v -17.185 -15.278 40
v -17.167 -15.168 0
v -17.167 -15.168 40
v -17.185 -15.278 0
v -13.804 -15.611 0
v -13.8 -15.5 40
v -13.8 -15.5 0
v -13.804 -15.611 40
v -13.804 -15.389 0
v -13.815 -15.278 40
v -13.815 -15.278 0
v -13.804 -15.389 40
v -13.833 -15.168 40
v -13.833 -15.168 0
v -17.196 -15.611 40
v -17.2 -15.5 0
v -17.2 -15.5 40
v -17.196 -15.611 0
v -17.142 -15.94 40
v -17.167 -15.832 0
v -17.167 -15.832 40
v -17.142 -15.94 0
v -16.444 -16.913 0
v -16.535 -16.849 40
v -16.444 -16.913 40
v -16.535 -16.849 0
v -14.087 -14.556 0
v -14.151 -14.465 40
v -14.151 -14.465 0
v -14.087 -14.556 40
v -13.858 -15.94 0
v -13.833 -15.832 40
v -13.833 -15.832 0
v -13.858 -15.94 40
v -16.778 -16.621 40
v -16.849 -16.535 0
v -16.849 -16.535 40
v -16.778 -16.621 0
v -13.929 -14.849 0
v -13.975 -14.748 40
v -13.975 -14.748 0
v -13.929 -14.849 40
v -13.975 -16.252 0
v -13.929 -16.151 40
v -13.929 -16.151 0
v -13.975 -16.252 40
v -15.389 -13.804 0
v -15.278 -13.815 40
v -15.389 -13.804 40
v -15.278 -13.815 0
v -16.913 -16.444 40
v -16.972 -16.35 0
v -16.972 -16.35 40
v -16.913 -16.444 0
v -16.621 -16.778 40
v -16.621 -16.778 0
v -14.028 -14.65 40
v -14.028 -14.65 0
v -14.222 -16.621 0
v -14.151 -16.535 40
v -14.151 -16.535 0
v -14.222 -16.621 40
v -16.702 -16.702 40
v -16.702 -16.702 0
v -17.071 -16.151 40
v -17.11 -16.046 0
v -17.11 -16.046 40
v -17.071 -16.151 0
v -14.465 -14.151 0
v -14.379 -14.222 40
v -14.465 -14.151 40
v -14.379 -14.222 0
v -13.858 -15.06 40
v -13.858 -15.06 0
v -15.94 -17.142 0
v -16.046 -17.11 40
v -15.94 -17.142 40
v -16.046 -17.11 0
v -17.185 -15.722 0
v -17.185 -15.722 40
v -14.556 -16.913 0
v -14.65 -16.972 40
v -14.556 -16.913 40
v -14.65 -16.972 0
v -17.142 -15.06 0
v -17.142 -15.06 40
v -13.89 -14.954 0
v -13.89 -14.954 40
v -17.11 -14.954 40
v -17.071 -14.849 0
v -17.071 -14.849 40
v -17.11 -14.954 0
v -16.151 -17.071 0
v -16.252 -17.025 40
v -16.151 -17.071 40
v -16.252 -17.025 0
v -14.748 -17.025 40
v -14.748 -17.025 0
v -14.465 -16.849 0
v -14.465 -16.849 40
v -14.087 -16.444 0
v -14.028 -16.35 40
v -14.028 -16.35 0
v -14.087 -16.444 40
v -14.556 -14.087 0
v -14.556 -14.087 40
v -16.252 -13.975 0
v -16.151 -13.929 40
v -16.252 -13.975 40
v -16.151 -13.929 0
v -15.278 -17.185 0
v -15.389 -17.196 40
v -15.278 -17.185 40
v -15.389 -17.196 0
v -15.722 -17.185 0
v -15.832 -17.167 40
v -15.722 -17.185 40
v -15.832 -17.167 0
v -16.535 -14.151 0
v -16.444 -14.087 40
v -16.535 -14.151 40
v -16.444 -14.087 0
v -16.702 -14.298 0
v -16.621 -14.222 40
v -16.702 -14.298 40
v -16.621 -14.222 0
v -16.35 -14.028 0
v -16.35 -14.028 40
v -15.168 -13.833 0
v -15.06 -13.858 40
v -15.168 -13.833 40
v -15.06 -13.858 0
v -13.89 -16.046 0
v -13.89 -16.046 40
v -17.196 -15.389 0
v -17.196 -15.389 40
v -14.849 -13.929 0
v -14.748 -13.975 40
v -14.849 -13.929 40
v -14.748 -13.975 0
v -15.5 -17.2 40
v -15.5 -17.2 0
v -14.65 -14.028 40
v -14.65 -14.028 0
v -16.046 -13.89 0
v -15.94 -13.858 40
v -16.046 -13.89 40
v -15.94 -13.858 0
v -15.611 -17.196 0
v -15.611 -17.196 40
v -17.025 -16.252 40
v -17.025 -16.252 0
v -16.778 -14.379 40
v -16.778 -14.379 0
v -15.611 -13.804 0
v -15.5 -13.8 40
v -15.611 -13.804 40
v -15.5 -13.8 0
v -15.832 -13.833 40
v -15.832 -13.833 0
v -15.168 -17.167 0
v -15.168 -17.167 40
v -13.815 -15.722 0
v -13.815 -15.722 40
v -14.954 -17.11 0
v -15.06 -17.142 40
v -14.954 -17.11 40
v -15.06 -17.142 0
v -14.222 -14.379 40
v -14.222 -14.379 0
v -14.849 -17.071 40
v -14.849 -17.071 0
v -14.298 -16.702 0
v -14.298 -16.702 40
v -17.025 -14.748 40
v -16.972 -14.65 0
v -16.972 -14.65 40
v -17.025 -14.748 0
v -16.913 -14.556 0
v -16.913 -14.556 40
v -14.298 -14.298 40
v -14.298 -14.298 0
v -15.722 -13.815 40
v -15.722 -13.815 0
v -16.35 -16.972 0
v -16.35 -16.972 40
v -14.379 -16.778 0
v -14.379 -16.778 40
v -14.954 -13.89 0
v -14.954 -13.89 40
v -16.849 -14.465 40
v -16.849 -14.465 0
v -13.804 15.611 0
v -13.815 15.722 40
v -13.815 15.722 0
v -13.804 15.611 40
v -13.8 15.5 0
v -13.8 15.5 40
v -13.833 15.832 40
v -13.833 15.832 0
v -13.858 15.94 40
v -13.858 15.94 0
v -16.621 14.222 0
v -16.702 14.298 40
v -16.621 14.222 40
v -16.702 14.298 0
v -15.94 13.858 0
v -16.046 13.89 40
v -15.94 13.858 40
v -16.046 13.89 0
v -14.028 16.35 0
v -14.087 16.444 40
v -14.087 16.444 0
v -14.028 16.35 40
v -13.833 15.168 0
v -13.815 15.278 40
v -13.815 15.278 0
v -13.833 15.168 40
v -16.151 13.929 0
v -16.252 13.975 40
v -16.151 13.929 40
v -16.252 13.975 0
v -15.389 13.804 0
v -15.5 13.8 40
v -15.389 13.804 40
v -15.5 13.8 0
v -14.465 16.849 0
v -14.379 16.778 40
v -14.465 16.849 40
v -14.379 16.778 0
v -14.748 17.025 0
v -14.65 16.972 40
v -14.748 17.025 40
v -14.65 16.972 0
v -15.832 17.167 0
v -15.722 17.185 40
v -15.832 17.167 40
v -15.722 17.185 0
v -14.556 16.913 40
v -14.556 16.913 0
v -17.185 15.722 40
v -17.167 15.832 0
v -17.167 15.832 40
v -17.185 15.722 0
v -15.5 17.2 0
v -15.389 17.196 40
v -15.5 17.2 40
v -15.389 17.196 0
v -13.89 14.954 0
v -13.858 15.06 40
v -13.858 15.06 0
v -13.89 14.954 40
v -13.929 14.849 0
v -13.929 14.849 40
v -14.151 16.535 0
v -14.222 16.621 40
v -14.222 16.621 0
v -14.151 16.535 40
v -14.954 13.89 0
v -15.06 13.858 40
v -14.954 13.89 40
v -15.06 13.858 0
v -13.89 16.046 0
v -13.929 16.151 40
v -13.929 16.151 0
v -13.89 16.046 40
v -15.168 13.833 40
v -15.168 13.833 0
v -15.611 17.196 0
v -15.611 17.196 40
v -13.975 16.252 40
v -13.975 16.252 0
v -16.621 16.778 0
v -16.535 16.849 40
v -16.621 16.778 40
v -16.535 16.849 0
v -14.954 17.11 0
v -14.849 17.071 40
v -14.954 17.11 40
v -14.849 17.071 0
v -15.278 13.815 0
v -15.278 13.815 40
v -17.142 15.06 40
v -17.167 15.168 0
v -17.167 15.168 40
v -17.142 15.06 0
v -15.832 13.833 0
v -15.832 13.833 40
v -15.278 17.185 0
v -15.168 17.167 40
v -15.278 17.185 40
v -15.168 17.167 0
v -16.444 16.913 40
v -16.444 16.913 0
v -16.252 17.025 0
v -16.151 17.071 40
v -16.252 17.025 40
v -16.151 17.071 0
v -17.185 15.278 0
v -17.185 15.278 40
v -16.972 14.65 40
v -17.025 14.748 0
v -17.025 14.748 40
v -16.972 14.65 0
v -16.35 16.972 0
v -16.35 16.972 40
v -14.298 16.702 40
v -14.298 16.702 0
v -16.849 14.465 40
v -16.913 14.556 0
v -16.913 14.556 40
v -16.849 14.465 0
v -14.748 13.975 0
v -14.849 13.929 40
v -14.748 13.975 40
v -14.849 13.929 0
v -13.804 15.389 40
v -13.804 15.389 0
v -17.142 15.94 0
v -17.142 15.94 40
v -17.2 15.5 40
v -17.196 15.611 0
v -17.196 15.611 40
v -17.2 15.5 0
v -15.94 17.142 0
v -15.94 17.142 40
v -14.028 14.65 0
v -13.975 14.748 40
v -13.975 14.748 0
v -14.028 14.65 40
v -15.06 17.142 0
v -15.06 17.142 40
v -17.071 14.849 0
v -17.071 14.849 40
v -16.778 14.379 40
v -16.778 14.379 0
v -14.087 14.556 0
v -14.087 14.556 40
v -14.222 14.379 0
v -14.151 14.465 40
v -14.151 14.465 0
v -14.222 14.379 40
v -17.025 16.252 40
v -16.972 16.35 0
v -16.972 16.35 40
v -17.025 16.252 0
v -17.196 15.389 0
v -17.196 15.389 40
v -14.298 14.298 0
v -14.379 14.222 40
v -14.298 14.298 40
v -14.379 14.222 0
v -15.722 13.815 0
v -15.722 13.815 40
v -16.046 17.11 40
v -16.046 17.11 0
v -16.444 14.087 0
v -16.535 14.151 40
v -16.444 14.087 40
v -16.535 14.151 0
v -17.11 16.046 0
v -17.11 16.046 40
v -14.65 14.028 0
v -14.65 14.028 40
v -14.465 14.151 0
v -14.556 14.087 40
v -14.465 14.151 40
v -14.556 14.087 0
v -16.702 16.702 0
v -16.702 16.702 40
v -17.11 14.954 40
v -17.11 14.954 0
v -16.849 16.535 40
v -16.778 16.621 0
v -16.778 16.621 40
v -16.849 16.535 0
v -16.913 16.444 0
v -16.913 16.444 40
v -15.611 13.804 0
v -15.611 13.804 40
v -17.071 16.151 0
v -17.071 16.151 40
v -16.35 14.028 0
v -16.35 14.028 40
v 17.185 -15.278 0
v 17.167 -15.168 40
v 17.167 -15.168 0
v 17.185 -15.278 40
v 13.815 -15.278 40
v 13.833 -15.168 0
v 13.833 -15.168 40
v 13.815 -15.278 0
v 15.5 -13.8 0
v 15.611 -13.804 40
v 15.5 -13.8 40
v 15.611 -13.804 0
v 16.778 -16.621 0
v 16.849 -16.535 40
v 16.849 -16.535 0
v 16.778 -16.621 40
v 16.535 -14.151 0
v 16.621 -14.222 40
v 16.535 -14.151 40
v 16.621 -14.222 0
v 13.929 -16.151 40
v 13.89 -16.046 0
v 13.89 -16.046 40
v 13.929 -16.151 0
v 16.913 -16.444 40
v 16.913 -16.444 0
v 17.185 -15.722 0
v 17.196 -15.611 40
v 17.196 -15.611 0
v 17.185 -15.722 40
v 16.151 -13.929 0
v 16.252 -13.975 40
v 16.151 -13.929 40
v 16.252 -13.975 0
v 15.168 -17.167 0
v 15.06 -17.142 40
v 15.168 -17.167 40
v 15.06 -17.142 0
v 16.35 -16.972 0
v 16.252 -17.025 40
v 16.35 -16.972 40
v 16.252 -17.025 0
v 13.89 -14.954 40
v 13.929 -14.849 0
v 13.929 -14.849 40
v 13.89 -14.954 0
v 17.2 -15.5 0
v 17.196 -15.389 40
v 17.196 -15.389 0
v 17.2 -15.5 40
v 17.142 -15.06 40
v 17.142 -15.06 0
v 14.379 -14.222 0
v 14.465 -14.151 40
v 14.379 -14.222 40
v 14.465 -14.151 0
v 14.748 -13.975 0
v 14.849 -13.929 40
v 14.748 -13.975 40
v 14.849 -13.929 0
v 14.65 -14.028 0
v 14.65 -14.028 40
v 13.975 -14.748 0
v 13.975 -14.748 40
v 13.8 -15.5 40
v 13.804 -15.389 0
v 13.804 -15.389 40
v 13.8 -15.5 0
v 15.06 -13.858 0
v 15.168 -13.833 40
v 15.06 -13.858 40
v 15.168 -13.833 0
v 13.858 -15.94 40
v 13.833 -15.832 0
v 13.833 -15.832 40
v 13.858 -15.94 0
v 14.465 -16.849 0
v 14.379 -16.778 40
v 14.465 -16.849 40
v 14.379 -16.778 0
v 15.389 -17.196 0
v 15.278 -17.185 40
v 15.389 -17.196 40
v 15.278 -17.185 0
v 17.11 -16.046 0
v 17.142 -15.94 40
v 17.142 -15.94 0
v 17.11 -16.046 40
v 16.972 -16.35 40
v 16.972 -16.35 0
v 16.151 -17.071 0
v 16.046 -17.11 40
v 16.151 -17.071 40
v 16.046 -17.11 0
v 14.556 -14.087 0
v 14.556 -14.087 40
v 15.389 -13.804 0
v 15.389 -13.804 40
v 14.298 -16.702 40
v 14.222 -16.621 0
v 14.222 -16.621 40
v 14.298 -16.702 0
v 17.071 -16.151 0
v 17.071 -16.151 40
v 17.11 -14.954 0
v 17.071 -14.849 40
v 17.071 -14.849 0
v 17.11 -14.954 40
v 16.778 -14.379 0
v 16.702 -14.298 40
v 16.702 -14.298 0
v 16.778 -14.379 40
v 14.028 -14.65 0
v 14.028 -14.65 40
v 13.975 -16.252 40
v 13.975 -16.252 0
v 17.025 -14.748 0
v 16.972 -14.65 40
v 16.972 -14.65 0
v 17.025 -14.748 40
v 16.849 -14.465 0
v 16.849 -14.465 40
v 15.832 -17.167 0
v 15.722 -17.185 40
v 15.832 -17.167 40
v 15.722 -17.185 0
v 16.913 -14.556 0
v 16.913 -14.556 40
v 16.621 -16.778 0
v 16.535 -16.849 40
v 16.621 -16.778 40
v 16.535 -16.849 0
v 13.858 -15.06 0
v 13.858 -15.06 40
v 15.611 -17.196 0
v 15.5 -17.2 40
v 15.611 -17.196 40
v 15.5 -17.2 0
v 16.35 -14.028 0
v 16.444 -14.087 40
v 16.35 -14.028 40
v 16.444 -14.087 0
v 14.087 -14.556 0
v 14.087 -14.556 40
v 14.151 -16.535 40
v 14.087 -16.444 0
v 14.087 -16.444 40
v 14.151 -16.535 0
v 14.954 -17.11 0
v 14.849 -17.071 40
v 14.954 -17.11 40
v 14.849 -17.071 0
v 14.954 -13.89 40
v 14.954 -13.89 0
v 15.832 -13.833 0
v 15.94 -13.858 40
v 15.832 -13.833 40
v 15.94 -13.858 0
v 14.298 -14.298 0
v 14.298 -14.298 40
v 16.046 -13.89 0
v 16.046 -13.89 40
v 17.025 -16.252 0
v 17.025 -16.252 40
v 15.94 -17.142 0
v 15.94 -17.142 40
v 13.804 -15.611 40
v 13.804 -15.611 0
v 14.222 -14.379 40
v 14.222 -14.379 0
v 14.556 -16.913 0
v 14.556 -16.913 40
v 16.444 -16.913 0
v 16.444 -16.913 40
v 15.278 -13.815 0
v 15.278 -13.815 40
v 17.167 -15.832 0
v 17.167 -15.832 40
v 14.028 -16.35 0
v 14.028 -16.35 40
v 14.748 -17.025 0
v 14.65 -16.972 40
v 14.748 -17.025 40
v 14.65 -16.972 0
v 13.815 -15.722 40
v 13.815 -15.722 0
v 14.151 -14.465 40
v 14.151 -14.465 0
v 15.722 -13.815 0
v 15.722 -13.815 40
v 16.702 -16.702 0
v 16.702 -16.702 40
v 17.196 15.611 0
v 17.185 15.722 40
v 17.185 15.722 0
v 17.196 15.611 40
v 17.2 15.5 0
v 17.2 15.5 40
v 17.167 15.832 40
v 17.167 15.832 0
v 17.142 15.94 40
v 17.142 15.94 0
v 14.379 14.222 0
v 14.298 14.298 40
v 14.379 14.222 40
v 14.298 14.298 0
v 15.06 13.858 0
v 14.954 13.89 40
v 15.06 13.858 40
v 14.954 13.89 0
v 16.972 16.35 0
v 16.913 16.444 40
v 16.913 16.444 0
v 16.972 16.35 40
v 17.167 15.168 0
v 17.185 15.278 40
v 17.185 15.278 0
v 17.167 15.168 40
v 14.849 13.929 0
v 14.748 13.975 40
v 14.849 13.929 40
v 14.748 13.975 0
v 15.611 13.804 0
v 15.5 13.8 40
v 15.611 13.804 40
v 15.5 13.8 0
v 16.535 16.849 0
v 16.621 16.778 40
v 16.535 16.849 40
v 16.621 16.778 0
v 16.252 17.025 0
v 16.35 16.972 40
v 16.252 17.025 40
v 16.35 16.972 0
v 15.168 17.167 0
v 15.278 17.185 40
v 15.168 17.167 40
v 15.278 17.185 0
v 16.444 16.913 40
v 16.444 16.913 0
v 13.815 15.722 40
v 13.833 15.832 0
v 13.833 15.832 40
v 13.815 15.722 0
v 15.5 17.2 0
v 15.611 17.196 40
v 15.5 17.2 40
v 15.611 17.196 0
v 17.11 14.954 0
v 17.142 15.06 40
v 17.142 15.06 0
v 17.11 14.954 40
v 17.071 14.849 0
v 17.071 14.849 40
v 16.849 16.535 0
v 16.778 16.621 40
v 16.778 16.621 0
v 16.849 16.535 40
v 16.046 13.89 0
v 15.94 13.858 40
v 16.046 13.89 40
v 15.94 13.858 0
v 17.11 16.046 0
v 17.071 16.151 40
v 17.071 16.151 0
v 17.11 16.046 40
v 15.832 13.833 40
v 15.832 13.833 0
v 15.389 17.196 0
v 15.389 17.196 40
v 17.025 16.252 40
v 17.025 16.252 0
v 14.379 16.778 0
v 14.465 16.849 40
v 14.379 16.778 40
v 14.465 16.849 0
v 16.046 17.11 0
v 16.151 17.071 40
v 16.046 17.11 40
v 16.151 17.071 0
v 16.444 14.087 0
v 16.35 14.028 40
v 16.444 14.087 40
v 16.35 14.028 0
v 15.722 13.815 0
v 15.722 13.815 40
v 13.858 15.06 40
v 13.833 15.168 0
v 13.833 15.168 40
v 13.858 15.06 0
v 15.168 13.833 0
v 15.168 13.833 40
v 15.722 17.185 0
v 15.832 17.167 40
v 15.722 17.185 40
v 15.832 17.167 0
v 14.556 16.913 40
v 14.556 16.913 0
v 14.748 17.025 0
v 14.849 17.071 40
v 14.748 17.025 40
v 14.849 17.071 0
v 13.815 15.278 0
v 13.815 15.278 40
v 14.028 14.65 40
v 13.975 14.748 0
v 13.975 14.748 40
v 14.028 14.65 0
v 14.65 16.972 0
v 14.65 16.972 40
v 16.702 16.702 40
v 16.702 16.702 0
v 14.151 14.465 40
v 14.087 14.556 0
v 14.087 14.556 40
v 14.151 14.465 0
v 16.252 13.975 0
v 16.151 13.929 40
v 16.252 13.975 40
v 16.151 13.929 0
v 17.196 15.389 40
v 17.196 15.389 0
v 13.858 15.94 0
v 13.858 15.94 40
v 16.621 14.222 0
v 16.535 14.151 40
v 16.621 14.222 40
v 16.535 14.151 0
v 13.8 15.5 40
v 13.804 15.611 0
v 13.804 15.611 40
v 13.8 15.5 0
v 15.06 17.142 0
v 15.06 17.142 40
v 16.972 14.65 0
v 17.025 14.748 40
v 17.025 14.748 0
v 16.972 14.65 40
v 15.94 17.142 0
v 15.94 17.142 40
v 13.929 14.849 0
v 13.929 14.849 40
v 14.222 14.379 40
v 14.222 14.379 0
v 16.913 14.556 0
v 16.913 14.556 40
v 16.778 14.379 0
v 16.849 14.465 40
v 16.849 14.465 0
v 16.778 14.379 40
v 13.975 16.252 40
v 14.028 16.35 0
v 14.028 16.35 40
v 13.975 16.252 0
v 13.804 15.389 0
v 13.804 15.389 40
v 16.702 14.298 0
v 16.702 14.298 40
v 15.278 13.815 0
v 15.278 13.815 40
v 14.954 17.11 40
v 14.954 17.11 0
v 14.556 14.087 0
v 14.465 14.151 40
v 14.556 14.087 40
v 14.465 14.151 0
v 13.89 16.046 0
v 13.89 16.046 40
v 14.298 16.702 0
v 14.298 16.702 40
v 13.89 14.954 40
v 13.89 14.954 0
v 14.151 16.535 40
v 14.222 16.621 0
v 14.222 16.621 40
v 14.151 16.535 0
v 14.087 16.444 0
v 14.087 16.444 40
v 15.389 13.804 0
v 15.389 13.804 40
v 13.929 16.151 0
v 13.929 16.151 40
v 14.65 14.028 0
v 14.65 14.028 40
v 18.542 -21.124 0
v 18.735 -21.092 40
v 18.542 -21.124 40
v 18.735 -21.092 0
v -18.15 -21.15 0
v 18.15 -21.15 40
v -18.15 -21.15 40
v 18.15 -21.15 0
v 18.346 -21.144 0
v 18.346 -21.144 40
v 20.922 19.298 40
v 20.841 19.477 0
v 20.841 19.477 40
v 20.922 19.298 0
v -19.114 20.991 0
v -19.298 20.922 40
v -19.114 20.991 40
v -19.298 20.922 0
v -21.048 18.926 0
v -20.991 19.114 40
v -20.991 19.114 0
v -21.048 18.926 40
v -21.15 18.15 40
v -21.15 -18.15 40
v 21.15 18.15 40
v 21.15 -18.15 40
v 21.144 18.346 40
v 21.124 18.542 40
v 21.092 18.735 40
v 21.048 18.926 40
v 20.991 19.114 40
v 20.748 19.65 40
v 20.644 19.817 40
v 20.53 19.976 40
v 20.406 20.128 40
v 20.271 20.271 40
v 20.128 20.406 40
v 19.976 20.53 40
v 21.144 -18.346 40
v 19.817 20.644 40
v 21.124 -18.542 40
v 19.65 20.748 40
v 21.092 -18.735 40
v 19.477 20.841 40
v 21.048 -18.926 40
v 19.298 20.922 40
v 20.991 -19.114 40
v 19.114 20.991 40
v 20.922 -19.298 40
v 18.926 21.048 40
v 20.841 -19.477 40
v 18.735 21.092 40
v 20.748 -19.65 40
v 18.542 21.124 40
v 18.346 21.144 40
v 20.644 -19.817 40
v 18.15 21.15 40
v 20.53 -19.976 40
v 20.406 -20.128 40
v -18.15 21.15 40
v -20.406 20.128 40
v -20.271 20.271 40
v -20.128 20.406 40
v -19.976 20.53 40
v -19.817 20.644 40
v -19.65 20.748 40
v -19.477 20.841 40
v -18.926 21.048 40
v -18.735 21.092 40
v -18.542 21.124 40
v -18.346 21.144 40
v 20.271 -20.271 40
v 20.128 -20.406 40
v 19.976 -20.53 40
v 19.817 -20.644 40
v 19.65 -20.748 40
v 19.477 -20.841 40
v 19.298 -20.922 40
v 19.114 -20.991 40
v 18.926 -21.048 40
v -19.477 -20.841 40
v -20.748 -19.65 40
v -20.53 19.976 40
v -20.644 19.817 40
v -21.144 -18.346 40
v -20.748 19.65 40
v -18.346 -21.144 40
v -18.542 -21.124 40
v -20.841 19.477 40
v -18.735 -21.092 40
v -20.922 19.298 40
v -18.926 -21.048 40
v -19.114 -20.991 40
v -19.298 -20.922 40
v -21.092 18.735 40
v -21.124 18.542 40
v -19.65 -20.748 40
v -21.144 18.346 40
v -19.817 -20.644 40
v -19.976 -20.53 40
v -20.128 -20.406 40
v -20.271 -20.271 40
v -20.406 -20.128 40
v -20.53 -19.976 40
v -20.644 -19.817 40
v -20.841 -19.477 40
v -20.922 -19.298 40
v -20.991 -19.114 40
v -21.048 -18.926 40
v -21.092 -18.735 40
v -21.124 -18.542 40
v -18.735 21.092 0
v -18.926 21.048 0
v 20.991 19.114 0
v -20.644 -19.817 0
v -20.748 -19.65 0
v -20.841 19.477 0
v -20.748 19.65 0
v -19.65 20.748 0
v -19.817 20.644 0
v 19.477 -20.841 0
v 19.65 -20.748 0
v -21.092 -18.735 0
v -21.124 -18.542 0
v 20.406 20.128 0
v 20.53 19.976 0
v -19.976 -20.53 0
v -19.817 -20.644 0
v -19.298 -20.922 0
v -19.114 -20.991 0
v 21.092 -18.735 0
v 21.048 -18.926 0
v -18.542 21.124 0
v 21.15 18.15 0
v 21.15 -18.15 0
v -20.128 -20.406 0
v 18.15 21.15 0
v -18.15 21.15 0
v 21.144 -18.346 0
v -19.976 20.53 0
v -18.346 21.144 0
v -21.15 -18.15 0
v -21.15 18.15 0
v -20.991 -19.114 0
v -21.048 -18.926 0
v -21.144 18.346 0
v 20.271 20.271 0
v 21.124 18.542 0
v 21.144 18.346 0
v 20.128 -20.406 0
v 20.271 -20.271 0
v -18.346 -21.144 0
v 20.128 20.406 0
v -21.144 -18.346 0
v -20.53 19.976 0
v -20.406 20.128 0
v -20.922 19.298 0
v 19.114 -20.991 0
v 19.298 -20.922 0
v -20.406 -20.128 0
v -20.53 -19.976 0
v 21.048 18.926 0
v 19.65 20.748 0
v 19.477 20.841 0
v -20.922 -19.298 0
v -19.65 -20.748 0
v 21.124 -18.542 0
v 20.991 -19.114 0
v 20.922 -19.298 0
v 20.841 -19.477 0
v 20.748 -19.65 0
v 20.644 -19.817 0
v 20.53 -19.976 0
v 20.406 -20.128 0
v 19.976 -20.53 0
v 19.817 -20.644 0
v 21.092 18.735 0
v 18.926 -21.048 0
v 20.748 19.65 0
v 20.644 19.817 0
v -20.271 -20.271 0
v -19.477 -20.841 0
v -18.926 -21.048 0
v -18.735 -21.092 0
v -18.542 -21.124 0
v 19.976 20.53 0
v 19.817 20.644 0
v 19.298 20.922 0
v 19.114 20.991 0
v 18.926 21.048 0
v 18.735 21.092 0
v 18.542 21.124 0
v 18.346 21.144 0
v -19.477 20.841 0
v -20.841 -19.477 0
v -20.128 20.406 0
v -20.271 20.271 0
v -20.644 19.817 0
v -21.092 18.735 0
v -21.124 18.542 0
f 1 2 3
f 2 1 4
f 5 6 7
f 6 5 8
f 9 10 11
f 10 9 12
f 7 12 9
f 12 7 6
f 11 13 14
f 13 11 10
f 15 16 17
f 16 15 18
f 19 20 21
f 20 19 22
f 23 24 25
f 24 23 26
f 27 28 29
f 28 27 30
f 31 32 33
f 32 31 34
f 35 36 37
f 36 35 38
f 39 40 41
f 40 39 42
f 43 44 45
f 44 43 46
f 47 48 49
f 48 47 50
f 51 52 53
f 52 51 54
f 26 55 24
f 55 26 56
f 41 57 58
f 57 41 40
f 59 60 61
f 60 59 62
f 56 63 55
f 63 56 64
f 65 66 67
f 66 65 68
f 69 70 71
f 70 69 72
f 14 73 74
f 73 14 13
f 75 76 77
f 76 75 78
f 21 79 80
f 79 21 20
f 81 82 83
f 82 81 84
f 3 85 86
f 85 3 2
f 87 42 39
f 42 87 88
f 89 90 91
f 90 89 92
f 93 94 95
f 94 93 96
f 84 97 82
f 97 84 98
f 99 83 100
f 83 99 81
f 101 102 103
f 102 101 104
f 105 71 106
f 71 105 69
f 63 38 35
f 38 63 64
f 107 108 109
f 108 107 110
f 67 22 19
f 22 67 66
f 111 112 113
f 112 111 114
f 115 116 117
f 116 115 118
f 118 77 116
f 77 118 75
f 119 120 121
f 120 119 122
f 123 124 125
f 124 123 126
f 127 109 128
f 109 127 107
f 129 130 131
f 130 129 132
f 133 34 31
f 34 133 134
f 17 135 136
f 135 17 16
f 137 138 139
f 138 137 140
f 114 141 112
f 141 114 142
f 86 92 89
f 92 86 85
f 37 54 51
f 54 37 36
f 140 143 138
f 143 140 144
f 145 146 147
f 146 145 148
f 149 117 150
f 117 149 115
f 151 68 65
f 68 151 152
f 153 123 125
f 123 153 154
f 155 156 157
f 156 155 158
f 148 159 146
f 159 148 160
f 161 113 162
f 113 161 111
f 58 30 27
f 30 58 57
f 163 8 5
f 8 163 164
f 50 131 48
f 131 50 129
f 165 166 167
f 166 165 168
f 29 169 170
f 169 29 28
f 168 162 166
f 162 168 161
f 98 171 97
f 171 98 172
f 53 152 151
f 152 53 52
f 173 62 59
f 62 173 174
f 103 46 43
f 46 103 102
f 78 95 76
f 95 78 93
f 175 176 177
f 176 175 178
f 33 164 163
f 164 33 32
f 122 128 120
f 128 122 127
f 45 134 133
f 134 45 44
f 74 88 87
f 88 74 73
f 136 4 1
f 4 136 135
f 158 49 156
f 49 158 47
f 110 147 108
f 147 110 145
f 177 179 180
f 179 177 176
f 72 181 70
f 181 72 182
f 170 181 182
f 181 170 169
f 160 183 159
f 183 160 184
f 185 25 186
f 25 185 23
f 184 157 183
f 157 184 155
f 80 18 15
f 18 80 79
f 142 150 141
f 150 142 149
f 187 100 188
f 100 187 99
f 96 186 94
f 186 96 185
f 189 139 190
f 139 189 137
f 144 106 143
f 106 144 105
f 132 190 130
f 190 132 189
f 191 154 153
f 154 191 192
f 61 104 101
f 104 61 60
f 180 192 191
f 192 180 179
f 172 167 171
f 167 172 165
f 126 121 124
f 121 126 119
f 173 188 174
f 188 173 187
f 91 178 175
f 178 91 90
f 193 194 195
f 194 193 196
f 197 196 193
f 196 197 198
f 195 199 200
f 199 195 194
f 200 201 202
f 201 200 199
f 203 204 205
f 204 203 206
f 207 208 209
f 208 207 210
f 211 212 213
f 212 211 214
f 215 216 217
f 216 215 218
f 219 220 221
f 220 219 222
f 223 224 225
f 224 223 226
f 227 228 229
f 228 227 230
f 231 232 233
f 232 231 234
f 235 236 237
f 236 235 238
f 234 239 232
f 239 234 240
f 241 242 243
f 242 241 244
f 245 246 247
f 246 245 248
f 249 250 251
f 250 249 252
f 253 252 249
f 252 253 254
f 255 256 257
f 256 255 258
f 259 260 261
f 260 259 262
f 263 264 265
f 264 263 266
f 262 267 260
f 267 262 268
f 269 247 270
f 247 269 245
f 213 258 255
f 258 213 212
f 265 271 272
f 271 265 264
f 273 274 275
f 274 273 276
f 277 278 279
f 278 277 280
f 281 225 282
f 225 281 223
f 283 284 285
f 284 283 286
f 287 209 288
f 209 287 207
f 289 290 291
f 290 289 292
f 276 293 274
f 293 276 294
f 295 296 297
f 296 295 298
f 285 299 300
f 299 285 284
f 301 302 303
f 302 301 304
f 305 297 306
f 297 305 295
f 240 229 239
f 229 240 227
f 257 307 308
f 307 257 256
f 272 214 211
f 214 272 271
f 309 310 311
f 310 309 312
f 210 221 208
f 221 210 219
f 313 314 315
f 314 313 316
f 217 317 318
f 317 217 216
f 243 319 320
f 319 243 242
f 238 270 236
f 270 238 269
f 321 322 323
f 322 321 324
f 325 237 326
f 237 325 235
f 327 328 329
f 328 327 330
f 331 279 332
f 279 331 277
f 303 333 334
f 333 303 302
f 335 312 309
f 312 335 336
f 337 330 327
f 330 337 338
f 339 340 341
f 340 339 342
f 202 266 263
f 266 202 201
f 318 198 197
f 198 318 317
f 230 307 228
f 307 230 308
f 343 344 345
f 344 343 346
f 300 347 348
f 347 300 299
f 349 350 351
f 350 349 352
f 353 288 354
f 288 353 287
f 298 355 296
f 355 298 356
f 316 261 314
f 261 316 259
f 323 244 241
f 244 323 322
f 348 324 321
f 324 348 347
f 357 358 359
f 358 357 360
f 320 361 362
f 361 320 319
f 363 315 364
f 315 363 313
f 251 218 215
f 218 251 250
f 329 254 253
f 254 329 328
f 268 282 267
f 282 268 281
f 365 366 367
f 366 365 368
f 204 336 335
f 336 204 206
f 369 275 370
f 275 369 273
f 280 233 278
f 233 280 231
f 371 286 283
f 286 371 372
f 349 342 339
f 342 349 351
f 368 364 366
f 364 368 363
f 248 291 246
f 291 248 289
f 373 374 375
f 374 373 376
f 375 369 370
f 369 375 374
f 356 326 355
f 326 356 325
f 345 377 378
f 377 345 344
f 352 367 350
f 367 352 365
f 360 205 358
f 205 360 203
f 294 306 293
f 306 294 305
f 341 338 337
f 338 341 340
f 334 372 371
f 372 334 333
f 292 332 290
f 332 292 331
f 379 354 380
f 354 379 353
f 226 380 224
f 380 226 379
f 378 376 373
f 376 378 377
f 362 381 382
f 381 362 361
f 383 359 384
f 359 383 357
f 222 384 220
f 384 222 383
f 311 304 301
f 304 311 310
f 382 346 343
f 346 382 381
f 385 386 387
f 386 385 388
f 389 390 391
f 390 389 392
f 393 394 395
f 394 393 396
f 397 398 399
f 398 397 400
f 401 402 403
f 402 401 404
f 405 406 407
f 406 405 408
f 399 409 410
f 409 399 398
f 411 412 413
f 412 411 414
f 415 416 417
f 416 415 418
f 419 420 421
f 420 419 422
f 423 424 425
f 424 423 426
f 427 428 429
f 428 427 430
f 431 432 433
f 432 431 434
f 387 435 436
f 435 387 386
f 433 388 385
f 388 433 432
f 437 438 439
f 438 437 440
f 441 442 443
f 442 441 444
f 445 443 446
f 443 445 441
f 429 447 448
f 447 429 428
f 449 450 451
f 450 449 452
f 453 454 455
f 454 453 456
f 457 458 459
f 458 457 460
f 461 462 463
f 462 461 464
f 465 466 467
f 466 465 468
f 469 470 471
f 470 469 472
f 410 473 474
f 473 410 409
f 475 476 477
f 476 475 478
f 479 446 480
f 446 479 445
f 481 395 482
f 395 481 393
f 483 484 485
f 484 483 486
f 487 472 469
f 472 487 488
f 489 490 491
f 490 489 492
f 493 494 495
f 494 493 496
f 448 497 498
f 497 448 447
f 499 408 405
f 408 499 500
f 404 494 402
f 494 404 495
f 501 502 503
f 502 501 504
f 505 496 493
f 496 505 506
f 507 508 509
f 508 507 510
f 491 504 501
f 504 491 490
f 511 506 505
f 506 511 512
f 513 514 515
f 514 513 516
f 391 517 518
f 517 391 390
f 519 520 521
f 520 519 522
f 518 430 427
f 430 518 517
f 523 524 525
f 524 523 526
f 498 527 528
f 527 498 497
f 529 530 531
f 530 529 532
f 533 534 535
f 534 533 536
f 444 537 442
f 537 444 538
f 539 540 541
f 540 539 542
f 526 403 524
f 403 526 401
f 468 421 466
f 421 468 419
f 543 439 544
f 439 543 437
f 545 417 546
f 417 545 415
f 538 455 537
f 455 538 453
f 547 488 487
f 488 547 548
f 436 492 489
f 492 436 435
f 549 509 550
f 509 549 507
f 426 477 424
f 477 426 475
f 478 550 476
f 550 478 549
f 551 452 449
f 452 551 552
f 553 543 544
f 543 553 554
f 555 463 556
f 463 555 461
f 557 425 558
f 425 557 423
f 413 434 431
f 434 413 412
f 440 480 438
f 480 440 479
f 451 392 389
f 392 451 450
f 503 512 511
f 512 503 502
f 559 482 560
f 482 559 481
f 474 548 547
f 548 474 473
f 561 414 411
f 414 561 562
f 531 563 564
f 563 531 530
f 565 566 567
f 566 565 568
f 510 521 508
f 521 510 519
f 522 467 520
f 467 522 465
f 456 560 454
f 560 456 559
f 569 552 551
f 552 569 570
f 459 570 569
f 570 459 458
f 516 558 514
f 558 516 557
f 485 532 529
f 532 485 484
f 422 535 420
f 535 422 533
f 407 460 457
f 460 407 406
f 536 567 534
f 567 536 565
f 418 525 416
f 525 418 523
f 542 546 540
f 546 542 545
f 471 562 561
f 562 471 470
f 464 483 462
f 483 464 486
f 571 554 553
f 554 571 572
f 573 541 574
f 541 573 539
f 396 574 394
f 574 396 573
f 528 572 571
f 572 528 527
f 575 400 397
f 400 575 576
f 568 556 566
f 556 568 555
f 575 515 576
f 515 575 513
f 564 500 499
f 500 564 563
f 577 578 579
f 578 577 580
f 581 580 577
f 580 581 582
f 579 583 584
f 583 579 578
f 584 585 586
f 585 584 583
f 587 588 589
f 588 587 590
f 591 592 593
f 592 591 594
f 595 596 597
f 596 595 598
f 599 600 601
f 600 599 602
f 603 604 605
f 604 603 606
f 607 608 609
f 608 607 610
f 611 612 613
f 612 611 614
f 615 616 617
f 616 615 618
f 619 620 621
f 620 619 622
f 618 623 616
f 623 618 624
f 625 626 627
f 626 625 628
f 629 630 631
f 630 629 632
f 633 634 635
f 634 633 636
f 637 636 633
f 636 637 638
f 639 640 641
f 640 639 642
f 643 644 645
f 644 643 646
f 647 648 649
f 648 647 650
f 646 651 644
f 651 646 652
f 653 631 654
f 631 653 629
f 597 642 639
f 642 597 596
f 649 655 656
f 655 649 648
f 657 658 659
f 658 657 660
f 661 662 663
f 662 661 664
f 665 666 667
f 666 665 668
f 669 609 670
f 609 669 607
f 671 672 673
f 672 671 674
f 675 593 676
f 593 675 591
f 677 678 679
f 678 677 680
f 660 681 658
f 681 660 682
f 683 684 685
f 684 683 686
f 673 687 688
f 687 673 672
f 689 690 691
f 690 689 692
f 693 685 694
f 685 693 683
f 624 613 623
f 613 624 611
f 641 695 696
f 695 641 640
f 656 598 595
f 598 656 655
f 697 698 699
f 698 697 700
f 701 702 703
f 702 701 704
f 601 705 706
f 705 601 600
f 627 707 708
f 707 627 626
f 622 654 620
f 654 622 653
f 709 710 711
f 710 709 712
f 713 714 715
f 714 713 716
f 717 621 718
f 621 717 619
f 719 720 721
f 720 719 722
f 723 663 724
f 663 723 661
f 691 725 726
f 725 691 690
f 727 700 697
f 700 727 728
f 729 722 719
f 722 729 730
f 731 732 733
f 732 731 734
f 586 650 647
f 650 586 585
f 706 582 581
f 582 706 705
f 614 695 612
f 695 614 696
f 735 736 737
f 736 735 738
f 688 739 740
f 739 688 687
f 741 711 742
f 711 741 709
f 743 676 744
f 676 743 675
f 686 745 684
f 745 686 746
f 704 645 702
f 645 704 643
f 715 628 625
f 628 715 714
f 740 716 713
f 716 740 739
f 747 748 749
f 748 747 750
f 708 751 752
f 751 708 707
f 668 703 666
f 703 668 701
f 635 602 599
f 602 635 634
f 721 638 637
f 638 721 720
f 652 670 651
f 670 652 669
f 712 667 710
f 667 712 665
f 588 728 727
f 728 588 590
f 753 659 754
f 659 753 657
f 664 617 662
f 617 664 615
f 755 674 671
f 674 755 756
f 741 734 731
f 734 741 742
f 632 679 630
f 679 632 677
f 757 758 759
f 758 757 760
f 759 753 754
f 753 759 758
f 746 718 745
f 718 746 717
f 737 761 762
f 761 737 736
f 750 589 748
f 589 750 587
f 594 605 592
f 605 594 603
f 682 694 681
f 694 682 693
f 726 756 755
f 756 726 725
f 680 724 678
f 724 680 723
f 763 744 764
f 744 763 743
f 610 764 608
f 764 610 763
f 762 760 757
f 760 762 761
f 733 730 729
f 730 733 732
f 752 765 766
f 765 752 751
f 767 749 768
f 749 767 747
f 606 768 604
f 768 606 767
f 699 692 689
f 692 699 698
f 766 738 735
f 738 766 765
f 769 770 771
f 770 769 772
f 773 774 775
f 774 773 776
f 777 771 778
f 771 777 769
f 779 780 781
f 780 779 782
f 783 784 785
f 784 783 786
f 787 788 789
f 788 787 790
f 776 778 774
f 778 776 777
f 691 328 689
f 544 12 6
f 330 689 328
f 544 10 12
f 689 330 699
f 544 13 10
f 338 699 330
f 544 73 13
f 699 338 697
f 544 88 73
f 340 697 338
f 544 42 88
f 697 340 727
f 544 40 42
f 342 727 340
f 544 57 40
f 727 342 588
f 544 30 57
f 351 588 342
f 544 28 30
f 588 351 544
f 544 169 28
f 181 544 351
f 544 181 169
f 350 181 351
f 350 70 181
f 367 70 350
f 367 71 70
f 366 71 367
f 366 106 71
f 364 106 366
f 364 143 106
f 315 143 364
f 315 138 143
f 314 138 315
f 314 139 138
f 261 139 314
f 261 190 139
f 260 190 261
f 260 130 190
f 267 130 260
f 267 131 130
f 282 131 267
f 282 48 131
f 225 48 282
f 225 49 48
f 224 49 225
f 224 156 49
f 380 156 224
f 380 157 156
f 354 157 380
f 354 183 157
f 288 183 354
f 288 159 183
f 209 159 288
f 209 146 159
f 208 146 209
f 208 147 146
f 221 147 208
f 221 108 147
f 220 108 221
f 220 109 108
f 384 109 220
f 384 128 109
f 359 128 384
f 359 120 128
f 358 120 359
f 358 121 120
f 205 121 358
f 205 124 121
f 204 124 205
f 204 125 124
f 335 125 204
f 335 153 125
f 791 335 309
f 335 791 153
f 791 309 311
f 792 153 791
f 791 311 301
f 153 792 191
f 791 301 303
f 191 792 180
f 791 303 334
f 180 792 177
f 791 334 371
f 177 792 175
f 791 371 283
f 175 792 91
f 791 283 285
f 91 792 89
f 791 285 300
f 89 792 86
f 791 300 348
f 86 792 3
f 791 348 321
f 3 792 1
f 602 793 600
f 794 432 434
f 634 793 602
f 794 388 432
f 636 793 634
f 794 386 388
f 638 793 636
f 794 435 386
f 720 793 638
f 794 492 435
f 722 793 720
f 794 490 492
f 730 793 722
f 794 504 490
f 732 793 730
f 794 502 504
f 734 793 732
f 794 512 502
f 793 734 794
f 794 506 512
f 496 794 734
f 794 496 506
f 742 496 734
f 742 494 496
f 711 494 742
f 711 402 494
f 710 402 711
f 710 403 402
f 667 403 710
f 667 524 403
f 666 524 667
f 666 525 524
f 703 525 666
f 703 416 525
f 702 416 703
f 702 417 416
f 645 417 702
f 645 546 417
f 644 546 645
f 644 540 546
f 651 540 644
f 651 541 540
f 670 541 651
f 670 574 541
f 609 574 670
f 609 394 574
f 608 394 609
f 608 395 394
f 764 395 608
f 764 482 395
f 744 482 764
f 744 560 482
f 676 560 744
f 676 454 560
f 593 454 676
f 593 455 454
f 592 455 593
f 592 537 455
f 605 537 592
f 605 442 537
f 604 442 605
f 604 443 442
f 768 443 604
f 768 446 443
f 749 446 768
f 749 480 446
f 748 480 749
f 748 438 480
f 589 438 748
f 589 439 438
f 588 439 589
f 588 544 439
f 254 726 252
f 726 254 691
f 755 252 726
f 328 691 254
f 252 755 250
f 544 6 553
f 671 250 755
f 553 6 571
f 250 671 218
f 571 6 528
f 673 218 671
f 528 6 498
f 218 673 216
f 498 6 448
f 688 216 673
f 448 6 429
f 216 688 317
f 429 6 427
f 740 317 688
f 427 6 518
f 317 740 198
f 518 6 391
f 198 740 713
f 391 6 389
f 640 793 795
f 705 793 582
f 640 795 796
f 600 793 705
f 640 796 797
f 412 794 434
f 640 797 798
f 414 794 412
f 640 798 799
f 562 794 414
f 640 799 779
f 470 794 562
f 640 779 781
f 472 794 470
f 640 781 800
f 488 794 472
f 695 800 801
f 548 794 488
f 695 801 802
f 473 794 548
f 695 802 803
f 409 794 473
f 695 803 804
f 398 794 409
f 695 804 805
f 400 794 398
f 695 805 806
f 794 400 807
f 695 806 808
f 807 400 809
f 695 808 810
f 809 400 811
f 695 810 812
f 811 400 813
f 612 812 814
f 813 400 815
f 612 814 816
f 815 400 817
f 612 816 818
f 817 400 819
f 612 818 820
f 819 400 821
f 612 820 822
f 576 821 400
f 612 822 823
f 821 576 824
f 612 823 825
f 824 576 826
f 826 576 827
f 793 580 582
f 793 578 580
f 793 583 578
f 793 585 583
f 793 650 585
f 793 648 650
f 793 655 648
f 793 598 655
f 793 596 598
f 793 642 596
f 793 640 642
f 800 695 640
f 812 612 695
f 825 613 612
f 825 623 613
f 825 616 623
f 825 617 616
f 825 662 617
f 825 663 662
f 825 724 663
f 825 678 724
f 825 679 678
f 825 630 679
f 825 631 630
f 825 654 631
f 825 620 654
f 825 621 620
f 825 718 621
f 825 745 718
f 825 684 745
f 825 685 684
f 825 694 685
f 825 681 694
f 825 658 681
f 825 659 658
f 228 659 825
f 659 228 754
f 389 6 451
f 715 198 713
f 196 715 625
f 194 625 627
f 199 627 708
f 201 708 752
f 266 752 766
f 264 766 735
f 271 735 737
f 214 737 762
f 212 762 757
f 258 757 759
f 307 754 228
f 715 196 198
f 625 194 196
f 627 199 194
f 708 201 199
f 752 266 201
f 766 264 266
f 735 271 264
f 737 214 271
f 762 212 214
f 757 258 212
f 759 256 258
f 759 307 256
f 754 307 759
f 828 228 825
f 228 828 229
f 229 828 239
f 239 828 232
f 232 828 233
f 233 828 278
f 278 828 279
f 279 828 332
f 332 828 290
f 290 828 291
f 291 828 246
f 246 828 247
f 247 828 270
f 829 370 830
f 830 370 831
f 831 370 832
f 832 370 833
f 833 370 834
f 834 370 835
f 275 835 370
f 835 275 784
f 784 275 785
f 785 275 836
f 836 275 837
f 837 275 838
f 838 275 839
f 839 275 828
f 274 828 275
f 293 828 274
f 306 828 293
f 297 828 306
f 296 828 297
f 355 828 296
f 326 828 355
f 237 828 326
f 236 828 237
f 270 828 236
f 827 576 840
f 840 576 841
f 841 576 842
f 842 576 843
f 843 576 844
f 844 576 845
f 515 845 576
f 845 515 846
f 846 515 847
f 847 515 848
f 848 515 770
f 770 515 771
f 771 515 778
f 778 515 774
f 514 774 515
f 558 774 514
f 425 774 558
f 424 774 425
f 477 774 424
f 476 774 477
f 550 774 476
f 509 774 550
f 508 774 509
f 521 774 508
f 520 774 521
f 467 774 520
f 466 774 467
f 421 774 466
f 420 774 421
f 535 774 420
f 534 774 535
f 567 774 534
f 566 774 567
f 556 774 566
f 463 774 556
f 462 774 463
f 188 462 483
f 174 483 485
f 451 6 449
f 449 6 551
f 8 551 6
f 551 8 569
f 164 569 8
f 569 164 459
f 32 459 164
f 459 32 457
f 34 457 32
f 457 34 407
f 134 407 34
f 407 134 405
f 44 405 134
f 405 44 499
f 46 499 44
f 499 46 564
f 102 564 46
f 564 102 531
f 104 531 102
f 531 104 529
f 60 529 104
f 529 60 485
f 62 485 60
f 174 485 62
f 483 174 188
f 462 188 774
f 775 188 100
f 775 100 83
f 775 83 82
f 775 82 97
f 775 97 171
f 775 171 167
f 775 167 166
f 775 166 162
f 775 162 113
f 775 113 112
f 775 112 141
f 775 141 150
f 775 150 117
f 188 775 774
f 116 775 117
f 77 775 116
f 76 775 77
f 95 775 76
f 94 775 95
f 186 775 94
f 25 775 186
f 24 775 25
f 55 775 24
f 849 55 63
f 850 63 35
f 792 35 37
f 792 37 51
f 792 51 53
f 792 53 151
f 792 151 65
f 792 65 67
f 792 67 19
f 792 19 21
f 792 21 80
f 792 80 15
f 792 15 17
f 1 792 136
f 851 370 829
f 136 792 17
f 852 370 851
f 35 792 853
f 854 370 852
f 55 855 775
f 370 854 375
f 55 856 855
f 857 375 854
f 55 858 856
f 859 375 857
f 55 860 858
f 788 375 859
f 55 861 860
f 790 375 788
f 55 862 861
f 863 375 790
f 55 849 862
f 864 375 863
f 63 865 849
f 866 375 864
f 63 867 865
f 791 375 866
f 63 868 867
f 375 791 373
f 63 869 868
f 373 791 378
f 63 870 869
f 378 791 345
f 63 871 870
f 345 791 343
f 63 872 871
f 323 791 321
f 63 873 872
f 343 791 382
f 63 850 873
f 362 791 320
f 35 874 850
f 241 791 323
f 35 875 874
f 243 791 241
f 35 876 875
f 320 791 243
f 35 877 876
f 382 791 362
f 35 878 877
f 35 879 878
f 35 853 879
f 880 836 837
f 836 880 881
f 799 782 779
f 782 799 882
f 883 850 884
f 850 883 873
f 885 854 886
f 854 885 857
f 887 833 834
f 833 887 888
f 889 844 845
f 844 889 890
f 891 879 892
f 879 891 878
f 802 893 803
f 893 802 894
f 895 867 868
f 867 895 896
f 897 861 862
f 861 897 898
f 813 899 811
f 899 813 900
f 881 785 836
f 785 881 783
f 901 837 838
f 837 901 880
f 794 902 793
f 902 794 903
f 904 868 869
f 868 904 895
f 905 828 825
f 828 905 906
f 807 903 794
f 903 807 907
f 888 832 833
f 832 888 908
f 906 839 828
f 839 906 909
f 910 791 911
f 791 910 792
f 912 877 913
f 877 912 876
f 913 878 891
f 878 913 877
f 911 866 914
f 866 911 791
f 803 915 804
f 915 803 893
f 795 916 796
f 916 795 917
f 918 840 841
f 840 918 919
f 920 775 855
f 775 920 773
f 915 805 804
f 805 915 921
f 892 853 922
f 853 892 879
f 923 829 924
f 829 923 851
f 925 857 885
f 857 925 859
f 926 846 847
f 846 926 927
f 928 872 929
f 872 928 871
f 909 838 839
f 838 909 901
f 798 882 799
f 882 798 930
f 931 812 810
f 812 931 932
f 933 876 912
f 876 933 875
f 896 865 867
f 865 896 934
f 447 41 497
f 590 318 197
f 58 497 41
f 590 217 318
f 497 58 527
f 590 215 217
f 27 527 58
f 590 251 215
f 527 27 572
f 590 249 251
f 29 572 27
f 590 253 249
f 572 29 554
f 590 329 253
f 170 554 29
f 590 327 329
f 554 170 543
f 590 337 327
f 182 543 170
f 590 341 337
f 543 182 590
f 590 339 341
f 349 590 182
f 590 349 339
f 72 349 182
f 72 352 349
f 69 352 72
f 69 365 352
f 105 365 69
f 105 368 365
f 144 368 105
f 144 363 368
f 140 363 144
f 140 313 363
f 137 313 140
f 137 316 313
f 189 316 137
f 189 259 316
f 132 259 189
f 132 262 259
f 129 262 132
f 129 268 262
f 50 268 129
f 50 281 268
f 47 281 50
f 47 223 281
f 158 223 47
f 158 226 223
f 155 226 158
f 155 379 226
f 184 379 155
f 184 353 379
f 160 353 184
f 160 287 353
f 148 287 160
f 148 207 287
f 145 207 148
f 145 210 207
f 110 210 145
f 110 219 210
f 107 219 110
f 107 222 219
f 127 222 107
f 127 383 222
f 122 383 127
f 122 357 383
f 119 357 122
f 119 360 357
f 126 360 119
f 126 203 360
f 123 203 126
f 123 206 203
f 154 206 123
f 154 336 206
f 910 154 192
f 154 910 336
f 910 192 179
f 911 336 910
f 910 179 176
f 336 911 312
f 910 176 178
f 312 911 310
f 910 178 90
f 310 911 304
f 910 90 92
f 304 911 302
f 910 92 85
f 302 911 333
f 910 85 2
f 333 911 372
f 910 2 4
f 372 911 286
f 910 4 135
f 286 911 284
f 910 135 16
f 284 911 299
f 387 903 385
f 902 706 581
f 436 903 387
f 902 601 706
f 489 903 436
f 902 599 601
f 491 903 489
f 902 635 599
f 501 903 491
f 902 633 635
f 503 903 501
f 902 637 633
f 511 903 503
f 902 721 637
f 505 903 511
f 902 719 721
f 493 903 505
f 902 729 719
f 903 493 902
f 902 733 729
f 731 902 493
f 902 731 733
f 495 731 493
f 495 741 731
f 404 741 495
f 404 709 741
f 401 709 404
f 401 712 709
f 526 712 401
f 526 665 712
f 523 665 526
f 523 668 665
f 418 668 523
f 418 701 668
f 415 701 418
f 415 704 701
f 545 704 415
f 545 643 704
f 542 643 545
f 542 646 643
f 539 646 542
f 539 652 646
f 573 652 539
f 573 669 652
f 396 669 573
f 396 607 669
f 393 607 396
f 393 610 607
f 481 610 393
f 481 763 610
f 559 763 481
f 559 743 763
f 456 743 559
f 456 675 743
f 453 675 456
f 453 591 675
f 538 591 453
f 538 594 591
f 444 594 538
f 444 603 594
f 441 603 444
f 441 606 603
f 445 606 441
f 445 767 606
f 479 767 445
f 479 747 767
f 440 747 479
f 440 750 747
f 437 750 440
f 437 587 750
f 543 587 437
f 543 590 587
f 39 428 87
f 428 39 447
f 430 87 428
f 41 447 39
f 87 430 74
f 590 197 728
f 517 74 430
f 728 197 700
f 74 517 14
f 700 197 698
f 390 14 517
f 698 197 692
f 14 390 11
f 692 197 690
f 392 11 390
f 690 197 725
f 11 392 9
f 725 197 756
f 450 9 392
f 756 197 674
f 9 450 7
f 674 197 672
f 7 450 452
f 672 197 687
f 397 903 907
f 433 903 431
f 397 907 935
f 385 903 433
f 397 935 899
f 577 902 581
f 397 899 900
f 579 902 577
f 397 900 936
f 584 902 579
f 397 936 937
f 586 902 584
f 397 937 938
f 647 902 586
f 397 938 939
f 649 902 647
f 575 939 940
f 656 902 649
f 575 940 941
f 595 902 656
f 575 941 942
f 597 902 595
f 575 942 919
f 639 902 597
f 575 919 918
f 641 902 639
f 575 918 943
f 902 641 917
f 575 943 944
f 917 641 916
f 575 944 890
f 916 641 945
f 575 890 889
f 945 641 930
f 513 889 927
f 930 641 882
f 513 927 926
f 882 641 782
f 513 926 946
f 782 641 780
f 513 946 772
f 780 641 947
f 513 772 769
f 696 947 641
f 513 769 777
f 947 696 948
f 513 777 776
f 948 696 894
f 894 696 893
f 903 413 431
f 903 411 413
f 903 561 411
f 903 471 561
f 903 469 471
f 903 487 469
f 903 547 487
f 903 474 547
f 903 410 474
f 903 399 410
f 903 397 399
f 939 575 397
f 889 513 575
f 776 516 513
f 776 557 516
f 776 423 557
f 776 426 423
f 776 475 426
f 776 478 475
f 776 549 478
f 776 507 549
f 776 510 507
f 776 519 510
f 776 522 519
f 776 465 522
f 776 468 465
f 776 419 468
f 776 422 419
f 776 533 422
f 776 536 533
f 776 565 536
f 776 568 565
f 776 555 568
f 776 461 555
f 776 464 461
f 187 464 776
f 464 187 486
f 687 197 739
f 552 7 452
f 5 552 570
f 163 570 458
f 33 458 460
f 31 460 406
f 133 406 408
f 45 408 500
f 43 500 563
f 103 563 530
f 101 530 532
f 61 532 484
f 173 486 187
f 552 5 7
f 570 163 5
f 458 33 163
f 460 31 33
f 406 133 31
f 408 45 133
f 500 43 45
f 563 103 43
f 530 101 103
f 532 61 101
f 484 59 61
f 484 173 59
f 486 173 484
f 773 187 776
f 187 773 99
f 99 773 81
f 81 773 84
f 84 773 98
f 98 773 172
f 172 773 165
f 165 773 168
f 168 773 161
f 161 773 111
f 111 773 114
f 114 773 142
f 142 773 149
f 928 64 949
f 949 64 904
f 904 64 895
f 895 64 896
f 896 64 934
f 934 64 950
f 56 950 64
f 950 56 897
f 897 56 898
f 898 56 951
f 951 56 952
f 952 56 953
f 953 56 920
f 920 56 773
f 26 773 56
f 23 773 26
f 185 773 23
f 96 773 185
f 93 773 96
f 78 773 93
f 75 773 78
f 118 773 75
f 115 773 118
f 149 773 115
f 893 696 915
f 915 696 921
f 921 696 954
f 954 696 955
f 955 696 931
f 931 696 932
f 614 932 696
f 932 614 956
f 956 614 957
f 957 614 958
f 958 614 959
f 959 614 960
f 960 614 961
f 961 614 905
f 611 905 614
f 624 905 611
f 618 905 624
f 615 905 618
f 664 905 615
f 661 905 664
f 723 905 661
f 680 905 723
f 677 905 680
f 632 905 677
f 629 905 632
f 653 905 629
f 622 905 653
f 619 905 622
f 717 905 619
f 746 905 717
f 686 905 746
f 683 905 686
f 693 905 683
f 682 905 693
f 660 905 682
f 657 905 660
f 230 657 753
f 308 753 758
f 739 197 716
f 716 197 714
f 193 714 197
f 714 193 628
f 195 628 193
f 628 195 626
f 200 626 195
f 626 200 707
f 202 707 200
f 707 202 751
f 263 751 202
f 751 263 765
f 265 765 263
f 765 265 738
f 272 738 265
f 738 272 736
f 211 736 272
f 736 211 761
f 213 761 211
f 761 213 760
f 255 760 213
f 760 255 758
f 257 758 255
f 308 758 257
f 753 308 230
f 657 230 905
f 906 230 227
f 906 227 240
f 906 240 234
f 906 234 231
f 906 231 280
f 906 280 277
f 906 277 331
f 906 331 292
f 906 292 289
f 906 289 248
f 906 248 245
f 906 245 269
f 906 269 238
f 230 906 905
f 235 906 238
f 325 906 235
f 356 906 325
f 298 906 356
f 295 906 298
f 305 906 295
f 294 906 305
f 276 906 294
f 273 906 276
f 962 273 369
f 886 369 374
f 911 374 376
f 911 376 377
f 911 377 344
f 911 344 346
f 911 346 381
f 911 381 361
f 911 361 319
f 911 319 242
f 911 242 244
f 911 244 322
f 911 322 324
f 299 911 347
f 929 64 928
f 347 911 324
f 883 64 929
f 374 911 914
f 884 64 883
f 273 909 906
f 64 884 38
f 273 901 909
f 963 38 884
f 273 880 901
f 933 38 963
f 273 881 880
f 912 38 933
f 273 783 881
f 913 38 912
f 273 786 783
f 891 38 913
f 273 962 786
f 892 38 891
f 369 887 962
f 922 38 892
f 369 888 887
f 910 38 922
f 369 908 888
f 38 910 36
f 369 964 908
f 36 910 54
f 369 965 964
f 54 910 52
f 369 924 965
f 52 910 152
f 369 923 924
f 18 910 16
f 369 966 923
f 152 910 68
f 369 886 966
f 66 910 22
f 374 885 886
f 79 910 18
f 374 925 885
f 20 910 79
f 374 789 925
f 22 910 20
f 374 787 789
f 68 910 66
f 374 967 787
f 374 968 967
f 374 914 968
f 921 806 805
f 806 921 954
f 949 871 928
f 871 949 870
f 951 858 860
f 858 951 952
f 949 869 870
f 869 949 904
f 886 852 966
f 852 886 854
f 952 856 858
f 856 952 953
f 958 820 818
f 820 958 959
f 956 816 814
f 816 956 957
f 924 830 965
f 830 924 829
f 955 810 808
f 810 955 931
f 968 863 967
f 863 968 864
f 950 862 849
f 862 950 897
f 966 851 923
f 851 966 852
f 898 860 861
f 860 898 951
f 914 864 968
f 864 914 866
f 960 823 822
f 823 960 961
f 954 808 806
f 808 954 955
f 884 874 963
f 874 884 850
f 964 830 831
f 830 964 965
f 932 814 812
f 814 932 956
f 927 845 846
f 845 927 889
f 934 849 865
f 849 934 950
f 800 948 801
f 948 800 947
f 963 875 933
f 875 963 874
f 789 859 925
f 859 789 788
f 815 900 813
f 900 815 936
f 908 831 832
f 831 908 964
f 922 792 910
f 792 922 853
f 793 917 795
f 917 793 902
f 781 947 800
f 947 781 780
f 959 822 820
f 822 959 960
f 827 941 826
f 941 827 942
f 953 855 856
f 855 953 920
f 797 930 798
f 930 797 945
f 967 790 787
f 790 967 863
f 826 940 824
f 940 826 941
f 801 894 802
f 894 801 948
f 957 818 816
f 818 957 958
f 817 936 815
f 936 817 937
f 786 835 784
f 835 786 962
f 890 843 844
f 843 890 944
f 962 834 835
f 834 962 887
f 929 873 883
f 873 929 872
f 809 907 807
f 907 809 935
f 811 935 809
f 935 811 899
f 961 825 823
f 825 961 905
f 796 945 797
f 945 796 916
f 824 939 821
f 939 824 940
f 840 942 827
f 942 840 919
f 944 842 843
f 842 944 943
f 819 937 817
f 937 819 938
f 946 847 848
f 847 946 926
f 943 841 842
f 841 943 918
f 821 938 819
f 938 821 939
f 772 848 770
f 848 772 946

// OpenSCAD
$fn=96;

// Parameters (mm)
face_w = 42.3;          // motor face width (square)
body_len = 40.0;        // motor body length (excluding front boss/shaft)
shaft_d = 8.0;          // shaft diameter
mount_spacing = 31.0;   // mounting hole spacing (center-to-center)
mount_hole_d = 3.4;     // typical NEMA17 clearance for M3
front_boss_d = 22.0;    // typical pilot/boss diameter
front_boss_h = 2.0;     // typical boss height
shaft_len = 20.0;       // visible shaft length
corner_r = 3.0;         // slight corner rounding

module rounded_square_prism(w, h, r){
    // centered at origin, extruded along +Z from 0..h
    linear_extrude(height=h)
        offset(r=r)
            offset(delta=-r)
                square([w, w], center=true);
}

module motor_body(){
    difference(){
        // Main body
        rounded_square_prism(face_w, body_len, corner_r);

        // Mounting holes through front face into body
        for (x = [-mount_spacing/2, mount_spacing/2])
            for (y = [-mount_spacing/2, mount_spacing/2])
                translate([x, y, -0.1])
                    cylinder(d=mount_hole_d, h=body_len+0.2);
    }

    // Front boss (pilot)
    translate([0,0,0])
        cylinder(d=front_boss_d, h=front_boss_h);

    // Shaft
    translate([0,0,front_boss_h])
        cylinder(d=shaft_d, h=shaft_len);
}

// Render with front face at Z=0, body extending +Z
motor_body();
